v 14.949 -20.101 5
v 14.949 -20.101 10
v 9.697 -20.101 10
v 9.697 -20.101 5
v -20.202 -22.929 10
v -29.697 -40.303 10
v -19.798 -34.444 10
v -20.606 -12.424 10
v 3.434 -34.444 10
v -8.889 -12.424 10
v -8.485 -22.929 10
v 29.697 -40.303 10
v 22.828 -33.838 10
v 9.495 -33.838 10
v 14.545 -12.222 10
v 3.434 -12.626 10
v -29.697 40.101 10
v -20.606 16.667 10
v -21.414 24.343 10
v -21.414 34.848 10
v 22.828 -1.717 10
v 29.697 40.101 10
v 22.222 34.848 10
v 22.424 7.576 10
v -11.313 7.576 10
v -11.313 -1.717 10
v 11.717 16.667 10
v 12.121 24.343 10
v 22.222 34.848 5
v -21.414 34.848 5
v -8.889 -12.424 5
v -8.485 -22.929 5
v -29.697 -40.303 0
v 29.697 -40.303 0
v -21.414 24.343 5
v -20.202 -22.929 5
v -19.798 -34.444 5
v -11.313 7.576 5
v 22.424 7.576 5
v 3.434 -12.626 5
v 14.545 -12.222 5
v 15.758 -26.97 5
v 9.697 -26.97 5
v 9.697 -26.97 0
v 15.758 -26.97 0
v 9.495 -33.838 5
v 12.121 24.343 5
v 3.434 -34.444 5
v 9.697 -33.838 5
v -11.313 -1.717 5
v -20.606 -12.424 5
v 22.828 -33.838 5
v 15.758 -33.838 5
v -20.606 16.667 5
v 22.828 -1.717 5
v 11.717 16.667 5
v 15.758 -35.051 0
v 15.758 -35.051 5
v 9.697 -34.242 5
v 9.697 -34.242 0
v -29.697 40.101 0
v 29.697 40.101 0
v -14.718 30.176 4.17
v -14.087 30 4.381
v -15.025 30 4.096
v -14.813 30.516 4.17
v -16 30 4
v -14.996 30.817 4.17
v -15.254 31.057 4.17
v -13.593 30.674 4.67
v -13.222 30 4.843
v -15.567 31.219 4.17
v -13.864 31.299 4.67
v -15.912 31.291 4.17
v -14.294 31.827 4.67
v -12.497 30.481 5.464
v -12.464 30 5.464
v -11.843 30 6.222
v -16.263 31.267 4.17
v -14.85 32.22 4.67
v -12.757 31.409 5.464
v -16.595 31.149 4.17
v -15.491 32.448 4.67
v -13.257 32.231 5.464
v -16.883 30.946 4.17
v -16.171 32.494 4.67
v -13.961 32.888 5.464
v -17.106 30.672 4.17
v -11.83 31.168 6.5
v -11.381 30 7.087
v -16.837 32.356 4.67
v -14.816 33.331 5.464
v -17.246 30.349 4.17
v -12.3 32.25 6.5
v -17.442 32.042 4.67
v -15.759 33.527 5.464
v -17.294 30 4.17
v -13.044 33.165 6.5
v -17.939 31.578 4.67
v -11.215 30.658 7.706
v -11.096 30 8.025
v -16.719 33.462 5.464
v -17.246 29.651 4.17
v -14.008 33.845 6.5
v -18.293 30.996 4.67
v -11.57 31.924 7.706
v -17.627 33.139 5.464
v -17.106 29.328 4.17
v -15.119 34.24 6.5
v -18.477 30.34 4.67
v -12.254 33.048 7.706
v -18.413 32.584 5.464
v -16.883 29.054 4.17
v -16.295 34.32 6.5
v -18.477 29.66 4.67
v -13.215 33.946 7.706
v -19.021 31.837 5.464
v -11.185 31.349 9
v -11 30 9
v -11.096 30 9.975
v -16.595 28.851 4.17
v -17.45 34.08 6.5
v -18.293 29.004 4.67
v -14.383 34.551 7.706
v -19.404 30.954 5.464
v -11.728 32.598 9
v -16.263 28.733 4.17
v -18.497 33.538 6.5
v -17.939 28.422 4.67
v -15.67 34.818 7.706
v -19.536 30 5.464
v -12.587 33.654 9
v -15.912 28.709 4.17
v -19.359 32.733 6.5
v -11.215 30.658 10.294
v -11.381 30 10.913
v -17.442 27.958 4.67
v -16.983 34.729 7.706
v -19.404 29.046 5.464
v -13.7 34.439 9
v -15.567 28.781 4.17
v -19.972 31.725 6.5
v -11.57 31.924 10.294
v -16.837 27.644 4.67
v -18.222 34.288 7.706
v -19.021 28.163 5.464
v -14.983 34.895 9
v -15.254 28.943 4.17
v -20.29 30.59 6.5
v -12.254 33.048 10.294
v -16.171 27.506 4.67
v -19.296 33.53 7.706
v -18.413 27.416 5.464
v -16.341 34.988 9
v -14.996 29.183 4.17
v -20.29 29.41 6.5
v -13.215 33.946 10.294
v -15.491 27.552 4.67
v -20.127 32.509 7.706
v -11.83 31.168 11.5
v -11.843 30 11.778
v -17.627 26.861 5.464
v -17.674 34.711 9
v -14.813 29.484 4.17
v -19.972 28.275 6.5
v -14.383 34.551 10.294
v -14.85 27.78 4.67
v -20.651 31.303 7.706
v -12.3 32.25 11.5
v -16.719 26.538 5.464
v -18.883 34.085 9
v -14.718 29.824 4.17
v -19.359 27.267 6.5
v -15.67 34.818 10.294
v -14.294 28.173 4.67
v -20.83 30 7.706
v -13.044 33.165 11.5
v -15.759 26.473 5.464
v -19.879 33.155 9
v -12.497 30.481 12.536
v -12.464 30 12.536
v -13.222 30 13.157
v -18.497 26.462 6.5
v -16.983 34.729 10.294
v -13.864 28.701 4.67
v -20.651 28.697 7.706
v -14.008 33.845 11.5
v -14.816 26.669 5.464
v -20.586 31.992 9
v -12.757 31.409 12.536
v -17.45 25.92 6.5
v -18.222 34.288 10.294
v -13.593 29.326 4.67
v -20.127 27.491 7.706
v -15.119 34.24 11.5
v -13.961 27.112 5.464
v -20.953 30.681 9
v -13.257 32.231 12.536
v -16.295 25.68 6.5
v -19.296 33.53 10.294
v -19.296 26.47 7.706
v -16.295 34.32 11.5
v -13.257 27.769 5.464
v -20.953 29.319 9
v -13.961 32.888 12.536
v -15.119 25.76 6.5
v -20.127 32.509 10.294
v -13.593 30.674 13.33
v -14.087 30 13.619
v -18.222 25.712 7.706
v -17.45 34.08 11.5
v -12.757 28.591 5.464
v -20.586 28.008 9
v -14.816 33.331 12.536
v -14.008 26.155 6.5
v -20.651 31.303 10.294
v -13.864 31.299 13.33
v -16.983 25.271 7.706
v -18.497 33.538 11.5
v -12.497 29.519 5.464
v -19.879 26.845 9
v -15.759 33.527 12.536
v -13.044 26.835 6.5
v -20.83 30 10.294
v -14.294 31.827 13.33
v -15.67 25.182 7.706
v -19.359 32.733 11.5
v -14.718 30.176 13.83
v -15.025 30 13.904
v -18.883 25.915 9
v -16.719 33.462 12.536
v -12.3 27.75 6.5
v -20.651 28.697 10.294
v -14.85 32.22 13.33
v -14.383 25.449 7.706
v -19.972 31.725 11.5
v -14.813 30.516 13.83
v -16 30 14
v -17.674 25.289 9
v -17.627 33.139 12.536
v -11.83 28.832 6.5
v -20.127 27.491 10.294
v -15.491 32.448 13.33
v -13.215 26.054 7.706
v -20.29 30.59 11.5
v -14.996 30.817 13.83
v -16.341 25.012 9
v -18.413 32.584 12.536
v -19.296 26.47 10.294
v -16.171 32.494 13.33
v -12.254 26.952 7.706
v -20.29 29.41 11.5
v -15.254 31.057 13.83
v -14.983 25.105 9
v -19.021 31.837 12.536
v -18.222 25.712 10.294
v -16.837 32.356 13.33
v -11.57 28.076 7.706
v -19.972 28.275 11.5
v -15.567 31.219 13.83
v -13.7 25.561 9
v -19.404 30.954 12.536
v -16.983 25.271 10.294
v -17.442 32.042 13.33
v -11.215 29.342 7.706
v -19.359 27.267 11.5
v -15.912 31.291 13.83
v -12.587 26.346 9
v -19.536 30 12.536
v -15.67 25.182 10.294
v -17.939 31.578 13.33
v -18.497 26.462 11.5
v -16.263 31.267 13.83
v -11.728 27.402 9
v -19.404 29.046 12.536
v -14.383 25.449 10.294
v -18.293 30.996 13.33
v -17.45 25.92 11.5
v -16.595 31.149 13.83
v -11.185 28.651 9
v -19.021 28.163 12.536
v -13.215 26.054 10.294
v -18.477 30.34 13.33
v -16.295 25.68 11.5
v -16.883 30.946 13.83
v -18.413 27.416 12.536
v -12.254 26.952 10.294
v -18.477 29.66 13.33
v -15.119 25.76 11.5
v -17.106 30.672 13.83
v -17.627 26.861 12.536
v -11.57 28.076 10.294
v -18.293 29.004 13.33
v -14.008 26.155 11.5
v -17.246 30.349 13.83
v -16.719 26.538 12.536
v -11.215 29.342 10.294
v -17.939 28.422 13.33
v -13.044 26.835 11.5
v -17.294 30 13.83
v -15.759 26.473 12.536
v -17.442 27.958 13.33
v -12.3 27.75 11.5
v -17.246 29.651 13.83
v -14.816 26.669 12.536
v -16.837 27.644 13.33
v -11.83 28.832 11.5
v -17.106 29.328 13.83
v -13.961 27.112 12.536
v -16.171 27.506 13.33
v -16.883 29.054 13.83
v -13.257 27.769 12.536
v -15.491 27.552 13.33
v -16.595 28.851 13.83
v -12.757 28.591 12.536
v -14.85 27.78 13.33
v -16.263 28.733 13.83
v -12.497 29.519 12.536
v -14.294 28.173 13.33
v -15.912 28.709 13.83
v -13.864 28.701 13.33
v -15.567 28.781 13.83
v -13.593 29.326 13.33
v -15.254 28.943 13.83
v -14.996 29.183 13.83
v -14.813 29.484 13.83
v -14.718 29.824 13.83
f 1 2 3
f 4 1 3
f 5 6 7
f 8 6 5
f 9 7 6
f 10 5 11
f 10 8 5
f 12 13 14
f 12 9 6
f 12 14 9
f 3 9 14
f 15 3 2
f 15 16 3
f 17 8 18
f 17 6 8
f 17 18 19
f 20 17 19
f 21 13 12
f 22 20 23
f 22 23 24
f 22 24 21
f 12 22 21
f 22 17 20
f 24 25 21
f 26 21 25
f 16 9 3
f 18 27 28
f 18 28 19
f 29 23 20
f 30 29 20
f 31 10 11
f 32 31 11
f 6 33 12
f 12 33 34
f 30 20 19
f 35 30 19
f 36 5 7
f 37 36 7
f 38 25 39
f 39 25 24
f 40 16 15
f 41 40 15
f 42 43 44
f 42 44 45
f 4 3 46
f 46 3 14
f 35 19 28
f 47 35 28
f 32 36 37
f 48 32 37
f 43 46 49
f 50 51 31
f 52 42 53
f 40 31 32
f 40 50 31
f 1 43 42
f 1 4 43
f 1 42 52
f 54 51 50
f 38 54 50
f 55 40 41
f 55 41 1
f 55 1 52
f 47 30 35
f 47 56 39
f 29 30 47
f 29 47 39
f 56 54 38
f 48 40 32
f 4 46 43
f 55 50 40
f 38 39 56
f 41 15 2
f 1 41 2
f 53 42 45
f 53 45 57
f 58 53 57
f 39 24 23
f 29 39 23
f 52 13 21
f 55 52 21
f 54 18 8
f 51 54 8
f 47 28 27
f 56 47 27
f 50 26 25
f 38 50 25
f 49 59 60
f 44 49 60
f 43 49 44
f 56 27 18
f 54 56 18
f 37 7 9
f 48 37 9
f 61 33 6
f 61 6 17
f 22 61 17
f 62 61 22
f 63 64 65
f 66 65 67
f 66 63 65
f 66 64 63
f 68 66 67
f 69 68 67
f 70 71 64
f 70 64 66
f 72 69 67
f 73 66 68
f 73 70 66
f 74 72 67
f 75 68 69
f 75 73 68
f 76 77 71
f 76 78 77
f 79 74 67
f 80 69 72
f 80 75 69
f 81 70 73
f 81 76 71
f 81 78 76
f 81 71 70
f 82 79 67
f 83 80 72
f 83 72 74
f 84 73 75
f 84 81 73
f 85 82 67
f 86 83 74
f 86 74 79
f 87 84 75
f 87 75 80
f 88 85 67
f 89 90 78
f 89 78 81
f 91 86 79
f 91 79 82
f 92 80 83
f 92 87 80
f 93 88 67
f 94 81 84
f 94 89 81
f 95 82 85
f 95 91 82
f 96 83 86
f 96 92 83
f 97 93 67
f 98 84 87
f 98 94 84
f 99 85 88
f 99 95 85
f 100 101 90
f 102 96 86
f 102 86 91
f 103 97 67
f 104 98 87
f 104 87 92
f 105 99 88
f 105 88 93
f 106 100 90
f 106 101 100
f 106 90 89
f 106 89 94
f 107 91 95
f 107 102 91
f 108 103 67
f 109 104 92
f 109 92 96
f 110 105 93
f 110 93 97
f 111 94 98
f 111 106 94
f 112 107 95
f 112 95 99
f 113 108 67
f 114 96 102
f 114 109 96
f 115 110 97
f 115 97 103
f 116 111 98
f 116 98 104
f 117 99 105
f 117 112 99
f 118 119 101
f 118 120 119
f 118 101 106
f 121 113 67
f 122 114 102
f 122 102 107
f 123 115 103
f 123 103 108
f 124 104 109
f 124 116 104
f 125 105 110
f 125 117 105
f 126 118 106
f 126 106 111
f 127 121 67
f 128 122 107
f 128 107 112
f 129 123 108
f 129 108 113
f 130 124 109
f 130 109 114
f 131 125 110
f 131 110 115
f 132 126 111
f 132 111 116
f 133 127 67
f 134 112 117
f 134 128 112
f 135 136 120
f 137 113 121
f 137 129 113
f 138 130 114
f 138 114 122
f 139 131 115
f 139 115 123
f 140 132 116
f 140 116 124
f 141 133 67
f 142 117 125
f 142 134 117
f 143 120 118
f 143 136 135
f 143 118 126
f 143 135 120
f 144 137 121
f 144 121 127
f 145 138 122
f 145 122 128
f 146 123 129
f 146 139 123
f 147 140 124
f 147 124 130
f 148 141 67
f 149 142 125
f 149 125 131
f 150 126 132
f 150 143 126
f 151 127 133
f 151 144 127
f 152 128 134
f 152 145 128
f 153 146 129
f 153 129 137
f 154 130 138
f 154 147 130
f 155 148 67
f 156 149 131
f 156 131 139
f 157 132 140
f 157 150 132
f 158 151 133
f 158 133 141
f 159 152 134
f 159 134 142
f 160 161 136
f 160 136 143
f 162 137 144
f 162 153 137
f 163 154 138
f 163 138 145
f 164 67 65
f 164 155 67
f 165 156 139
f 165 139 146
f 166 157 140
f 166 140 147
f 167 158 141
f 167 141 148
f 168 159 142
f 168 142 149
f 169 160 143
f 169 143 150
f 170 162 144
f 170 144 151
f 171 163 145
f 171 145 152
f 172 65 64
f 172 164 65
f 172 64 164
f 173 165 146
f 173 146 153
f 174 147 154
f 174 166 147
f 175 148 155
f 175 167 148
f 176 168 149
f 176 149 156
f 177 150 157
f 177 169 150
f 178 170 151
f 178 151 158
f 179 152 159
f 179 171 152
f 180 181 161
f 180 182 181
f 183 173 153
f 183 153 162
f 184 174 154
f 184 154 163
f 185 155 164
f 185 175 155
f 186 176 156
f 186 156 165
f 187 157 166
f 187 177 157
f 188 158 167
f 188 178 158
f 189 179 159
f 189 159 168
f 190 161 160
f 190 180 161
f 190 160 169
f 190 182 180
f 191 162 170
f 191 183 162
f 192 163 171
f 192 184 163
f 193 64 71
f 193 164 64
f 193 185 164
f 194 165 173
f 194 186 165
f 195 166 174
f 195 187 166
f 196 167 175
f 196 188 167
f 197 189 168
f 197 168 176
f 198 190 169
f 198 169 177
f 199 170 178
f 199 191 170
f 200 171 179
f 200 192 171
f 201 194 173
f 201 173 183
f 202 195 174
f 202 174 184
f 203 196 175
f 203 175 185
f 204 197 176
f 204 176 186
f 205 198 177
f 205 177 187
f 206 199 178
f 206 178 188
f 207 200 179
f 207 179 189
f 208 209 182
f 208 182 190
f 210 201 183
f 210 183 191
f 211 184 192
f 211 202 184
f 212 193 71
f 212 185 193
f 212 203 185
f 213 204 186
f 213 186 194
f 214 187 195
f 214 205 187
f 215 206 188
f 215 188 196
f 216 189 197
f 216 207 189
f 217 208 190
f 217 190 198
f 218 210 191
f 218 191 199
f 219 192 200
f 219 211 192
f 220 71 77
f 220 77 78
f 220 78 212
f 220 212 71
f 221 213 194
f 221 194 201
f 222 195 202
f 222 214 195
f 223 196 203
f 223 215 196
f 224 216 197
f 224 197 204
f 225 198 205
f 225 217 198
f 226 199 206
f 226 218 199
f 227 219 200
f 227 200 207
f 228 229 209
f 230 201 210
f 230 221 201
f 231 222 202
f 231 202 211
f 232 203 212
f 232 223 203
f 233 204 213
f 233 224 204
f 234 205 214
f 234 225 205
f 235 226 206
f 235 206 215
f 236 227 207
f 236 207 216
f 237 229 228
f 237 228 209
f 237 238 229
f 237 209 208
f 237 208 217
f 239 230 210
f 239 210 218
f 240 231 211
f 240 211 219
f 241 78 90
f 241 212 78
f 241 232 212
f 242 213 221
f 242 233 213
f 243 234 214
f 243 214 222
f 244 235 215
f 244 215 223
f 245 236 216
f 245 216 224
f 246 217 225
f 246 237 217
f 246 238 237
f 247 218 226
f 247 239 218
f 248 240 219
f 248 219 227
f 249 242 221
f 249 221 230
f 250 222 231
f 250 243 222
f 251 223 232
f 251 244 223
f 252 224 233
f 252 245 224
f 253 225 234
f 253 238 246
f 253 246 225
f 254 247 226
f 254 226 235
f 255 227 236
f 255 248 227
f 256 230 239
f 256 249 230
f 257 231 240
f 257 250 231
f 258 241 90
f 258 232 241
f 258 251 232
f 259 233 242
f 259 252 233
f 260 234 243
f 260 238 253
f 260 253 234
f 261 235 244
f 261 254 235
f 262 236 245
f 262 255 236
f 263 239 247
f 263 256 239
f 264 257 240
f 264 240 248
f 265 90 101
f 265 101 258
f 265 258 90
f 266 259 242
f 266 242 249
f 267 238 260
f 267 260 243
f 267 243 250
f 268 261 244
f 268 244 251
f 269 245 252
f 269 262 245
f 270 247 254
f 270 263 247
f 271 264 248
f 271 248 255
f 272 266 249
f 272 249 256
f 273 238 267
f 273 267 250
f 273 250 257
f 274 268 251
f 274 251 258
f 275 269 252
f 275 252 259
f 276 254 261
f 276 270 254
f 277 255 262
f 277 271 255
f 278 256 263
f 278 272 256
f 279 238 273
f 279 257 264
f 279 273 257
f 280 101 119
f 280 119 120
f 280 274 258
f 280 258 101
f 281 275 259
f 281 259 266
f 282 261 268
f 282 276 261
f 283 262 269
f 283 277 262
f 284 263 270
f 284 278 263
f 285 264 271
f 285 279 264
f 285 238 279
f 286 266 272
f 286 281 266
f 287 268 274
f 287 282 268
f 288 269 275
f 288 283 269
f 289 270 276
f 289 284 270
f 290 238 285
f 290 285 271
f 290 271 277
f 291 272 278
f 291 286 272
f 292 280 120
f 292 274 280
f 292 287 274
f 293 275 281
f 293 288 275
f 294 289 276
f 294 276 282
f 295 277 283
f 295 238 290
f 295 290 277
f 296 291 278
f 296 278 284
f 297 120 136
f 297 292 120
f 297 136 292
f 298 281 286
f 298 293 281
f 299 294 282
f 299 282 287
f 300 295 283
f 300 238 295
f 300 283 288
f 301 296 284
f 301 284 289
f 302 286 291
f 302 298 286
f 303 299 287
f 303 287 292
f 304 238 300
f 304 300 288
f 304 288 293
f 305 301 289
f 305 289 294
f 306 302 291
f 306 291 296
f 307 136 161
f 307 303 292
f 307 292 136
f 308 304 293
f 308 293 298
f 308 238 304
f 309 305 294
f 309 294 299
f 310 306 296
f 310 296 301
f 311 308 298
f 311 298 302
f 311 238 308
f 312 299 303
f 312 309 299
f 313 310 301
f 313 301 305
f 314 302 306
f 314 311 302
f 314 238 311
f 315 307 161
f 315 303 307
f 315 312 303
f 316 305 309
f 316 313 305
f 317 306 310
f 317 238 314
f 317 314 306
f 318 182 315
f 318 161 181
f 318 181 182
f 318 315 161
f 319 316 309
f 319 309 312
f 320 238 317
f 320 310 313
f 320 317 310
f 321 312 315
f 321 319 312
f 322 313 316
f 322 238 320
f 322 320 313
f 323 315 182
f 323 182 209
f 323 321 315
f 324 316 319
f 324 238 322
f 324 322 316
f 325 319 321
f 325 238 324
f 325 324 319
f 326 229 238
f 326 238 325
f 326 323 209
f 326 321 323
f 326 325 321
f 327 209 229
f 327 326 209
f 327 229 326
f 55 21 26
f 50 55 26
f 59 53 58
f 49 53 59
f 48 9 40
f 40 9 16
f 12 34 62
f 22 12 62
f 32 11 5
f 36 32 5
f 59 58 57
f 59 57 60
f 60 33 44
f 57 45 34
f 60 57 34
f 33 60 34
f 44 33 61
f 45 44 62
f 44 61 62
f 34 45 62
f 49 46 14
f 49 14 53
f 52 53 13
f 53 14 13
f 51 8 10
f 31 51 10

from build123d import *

# Parameters (mm, degrees)
SKETCH_W        = 59.393944
SKETCH_H        = 80.404041
PAD_DEPTH       = 10
POCKET_DEPTH    = 5
POCKET001_DEPTH = 5.001


with BuildPart() as body:
    # Sketch → Pad (new body)
    with BuildSketch(Plane.XY):
        with Locations((4e-06, -0.101011)):
            Rectangle(SKETCH_W, SKETCH_H)
    extrude(amount=PAD_DEPTH)

    # Sketch001 (on Face6 of Pad) → Pocket (cut)
    with BuildSketch(Plane.XY.offset(10)):
        Polygon((22.222214, 34.848495), (-21.414135, 34.848495), (-21.414135, 24.343437), (12.121216, 24.343437), (11.717175, 16.666668), (-20.60606, 16.666668), (-20.60606, -12.424243), (-8.888883, -12.424243), (-8.484843, -22.929292), (-20.202017, -22.929292), (-19.797977, -34.444443), (3.434352, -34.444443), (3.434352, -12.626264), (14.545455, -12.222222), (14.949498, -20.101009), (9.696976, -20.101009), (9.494952, -33.838383), (22.828302, -33.838383), (22.828302, -1.717174), (-11.313124, -1.717174), (-11.313124, 7.575759), (22.424244, 7.575759), align=None)
    extrude(amount=-POCKET_DEPTH, mode=Mode.SUBTRACT)

    # Sketch002 (on Face29 of Pocket) → Pocket001 (cut, through all)
    with BuildSketch(Plane.XY.offset(5)):
        Polygon((9.696976, -26.969696), (15.757576, -26.969696), (15.757576, -35.050507), (9.696976, -34.242424), align=None)
    extrude(amount=-POCKET001_DEPTH, mode=Mode.SUBTRACT)


with BuildPart() as sphere:
    # Sphere → Sphere (revolve)
    with BuildSketch(Plane(origin=(-16, 30, 9), x_dir=(1, 0, 0), z_dir=(0, -1, 0))):
        with BuildLine():
            ThreePointArc((0, -5), (5, 0), (0, 5))
            Line((0, 5), (0, -5))
        make_face()
    revolve(axis=Axis((-16, 30, 9), (0, 0, 1)))


solid = Compound([body.part, sphere.part])
